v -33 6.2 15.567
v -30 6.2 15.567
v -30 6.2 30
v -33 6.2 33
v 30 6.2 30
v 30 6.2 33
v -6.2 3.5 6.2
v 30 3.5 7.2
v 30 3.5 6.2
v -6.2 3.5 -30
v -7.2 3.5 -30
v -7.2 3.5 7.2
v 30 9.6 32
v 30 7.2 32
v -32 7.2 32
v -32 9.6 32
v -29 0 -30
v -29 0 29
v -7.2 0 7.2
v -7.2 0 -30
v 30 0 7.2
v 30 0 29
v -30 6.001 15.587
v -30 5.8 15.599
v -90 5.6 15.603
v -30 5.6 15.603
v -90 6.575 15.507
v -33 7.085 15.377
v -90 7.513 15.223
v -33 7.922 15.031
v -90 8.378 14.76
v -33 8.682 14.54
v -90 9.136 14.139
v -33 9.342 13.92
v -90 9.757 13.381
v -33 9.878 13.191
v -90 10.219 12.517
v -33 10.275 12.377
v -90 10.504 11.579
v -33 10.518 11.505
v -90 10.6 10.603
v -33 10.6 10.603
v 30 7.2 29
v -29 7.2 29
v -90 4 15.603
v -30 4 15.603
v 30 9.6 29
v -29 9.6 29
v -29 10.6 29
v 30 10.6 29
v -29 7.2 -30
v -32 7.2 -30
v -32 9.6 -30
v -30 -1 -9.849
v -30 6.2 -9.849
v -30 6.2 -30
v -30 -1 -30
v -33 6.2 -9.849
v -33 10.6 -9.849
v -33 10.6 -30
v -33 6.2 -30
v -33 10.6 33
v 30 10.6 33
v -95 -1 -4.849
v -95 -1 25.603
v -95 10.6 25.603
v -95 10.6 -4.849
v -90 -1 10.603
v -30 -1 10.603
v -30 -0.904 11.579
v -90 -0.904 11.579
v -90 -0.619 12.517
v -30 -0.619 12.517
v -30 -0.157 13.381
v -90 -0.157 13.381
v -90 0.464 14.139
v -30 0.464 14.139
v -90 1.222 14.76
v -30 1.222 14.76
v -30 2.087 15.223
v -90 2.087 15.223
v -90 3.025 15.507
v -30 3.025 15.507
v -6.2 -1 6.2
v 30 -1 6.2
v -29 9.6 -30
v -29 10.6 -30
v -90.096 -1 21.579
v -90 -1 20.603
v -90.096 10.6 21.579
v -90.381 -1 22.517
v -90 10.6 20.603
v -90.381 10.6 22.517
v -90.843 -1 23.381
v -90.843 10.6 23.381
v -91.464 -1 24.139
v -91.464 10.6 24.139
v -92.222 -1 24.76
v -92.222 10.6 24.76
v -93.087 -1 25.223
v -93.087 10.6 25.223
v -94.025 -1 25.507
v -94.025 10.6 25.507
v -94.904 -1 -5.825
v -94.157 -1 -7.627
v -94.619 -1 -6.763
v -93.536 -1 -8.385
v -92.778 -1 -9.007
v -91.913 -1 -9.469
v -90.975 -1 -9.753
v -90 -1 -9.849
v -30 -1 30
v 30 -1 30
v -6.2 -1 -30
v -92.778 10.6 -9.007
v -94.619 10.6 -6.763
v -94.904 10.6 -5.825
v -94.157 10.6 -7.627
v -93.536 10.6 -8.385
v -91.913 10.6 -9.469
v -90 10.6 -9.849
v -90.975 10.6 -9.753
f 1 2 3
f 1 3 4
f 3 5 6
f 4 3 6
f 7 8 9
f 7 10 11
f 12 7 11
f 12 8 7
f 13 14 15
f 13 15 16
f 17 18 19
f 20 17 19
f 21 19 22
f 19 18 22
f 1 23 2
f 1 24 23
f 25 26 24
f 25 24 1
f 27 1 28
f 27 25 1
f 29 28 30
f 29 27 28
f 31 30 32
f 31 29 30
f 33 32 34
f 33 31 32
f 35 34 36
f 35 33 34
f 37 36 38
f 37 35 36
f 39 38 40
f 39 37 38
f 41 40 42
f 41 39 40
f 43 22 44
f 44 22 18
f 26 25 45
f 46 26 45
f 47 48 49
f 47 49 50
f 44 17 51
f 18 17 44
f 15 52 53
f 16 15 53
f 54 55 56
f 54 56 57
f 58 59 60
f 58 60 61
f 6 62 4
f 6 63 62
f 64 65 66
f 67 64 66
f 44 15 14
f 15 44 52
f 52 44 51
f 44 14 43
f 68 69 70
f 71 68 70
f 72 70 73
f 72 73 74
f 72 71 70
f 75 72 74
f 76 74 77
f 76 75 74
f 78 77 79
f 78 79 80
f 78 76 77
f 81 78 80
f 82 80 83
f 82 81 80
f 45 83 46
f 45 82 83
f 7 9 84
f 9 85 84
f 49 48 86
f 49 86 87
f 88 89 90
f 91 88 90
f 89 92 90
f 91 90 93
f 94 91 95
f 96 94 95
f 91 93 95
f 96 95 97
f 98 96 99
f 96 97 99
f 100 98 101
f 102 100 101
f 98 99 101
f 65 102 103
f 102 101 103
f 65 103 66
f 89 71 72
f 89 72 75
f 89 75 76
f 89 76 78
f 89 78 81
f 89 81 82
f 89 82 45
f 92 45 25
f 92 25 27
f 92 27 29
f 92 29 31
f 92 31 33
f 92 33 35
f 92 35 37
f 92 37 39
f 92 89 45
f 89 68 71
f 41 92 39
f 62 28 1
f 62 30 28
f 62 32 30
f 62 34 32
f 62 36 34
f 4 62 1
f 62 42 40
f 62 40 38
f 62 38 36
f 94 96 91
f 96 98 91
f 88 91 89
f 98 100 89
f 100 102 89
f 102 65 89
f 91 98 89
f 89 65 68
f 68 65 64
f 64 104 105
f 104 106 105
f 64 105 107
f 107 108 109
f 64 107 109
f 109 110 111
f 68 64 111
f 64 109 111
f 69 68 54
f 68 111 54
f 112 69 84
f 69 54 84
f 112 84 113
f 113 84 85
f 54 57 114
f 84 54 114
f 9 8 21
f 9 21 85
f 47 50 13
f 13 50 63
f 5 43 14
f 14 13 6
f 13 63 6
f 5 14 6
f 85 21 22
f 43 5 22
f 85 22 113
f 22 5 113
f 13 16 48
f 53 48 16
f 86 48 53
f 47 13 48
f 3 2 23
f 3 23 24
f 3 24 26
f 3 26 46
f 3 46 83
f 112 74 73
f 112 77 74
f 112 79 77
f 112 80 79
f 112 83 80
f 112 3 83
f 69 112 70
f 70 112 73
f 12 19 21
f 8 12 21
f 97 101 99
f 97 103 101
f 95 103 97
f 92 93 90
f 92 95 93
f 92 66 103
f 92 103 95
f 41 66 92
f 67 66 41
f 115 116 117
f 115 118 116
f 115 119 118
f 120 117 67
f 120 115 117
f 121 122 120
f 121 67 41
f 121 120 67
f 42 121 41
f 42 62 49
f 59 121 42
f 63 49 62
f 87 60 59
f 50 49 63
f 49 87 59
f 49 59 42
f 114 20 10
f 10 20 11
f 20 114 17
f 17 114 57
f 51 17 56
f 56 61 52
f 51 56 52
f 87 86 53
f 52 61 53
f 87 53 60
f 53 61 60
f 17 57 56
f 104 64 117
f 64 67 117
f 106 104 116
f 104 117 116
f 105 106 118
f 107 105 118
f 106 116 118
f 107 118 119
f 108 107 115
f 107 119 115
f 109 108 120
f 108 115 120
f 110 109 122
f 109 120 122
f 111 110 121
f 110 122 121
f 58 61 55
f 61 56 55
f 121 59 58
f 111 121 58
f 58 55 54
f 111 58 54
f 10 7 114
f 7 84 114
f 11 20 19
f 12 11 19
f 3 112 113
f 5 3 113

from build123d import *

# Parameters (mm, degrees)
F0_W         = 23.8
F0_H         = 23.8
F0_W_2       = 36.2
F0_H_2       = 36.2
F1_DEPTH     = 1
F2_W         = 59
F2_H         = 1
F2_W_2       = 1
F2_H_2       = 59
F3_DEPTH     = 7.2
F4_W         = 36.2
F4_H         = 1
F5_DEPTH     = 3.5
F6_W         = 60
F6_H         = 1
F7_DEPTH     = 3
F8_W         = 60
F8_H         = 1
F9_DEPTH     = 3.4
F10_W        = 60
F10_H        = 1
F11_DEPTH    = 3
F12_W        = 1
F12_H        = 60
F13_DEPTH    = 3
F14_W        = 1
F14_H        = 60
F15_DEPTH    = 3.4
F16_W        = 1
F16_H        = 60
F17_DEPTH    = 3
F18_DEPTH    = 3
F19_DEPTH    = 2
F20_W        = 7.2
F20_H        = 25.4523856565
F21_DEPTH    = 65
F22_W        = 4.4
F22_H        = 25.4523856565
F23_DEPTH    = 62
F24_W        = 5
F24_H        = 11.6
F25_DEPTH    = 10
F26_R        = 4.99999
F27_T1_DEPTH = 60
F27_T3_DEPTH = 57
F27_T8_DEPTH = 69.5
F28_R        = 5


# Not quite as in the source:
# - a fillet or chamfer that OpenCascade refuses, or shapes differently, is made with other operations: its cross-section is extruded or revolved along the edge and cut away or added
# - a fillet or chamfer is up to 0.001 mm smaller than in the source, because OpenCascade refuses the exact size


with BuildPart() as f1:
    # F0 (on Front) → F1 (new body)
    with BuildSketch(Plane.XZ):
        with Locations((-18.1, 18.1)):
            Rectangle(F0_W, F0_H)
        with Locations((11.9, 18.1)):
            Rectangle(F0_W_2, F0_H)
        with Locations((-18.1, -11.9)):
            Rectangle(F0_W, F0_H_2)
    extrude(amount=F1_DEPTH)

    # F2 (on face) → F3 (join)
    with BuildSketch(Plane(origin=(0, 0, 0), x_dir=(-1, 0, 0), z_dir=(0, 1, 0))):
        with Locations((-0.5, 29.5)):
            Rectangle(F2_W, F2_H)
        with Locations((29.5, 29.5)):
            Rectangle(F2_W_2, F2_H)
        with Locations((29.5, -0.5)):
            Rectangle(F2_W_2, F2_H_2)
    extrude(amount=F3_DEPTH)

    # F4 (on face) → F5 (join)
    with BuildSketch(Plane(origin=(0, 0, 0), x_dir=(-1, 0, 0), z_dir=(0, 1, 0))):
        with Locations((-11.9, 6.7)):
            Rectangle(F4_W, F4_H)
        Polygon((6.2, 7.2), (6.2, 6.2), (6.2, -30), (7.2, -30), (7.2, 7.2), align=None)
    extrude(amount=F5_DEPTH)

    # F6 (on face) → F7 (join)
    with BuildSketch(Plane.XY.offset(30)):
        with Locations((0, 6.7)):
            Rectangle(F6_W, F6_H)
    extrude(amount=F7_DEPTH)

    # F8 (on face) → F9 (join)
    with BuildSketch(Plane(origin=(0, 7.2, 0), x_dir=(-1, 0, 0), z_dir=(0, 1, 0))):
        with Locations((0, 32.5)):
            Rectangle(F8_W, F8_H)
    extrude(amount=F9_DEPTH)

    # F10 (on face) → F11 (join)
    with BuildSketch(Plane(origin=(0, 0, 32), x_dir=(1, 0, 0), z_dir=(0, 0, -1))):
        with Locations((0, -10.1)):
            Rectangle(F10_W, F10_H)
    extrude(amount=F11_DEPTH)

    # F12 (on face) → F13 (join)
    with BuildSketch(Plane(origin=(-30, 0, 0), x_dir=(0, -1, 0), z_dir=(-1, 0, 0))):
        with Locations((-6.7, 0)):
            Rectangle(F12_W, F12_H)
    extrude(amount=F13_DEPTH)

    # F14 (on face) → F15 (join)
    with BuildSketch(Plane(origin=(0, 7.2, 0), x_dir=(-1, 0, 0), z_dir=(0, 1, 0))):
        with Locations((32.5, 0)):
            Rectangle(F14_W, F14_H)
    extrude(amount=F15_DEPTH)

    # F16 (on face) → F17 (join)
    with BuildSketch(Plane.YZ.offset(-32)):
        with Locations((10.1, 0)):
            Rectangle(F16_W, F16_H)
    extrude(amount=F17_DEPTH)

    # F18 (add): a face of the model
    f18_faces = [f1.faces().sort_by_distance(p)[0] for p in [
        (-30, 6.2532541078, 31.5),
    ]]
    extrude(f18_faces, amount=F18_DEPTH)

    # F19 (add): a face of the model
    f19_faces = [f1.faces().sort_by_distance(p)[0] for p in [
        (-32.5, 8.4, 30),
    ]]
    extrude(f19_faces, amount=F19_DEPTH)

    # F20 (on face) → F21 (join)
    with BuildSketch(Plane(origin=(-30, 0, 0), x_dir=(0, -1, 0), z_dir=(-1, 0, 0))):
        with Locations((-2.6, 2.8769155033)):
            Rectangle(F20_W, F20_H)
    extrude(amount=F21_DEPTH)

    # F22 (on face) → F23 (join)
    with BuildSketch(Plane(origin=(-33, 0, 0), x_dir=(0, -1, 0), z_dir=(-1, 0, 0))):
        with Locations((-8.4, 2.8769155033)):
            Rectangle(F22_W, F22_H)
    extrude(amount=F23_DEPTH)

    # F24 (on face) → F25 (join)
    with BuildSketch(Plane.XY.offset(15.6031083316)):
        with Locations((-92.5, 4.8)):
            Rectangle(F24_W, F24_H)
    extrude(amount=F25_DEPTH)

    # F26 (radius 5 in the source; OpenCascade refuses exactly that, so slightly less here)
    f26_edges = [f1.edges().sort_by_distance(p)[0] for p in [
        (-90, 4.8, 25.603108),
    ]]
    fillet(f26_edges, radius=F26_R)

    # F27: fillet of radius 5 on 2 edges, made by hand

    # F27_s2 → F27_t1 (cut)
    with BuildSketch(Plane.YZ.offset(-90)):
        with BuildLine():
            ThreePointArc((-1, 10.6031083316), (0.4644660941, 14.1386422375), (4, 15.6031083316))
            Line((4, 15.6031083316), (-1, 15.6031083316))
            Line((-1, 15.6031083316), (-1, 10.6031083316))
        make_face()
    extrude(amount=F27_T1_DEPTH, mode=Mode.SUBTRACT)

    # F27_s4 → F27_t3 (cut)
    with BuildSketch(Plane.YZ.offset(-90)):
        with BuildLine():
            ThreePointArc((5.6, 15.6031083316), (9.1355339059, 14.1386422375), (10.6, 10.6031083316))
            Line((10.6, 10.6031083316), (10.6, 15.6031083316))
            Line((10.6, 15.6031083316), (5.6, 15.6031083316))
        make_face()
    extrude(amount=F27_T3_DEPTH, mode=Mode.SUBTRACT)


with BuildPart() as f27_tool6:
    # F27_s7 → F27_t8 (new body)
    with BuildSketch(Plane.YZ.offset(-20.5)):
        with BuildLine():
            ThreePointArc((5.6, 15.6031083316), (9.1355339059, 14.1386422375), (10.6, 10.6031083316))
            Line((10.6, 10.6031083316), (10.6, 15.6031083316))
            Line((10.6, 15.6031083316), (5.6, 15.6031083316))
        make_face()
    extrude(amount=-F27_T8_DEPTH)

    split(bisect_by=Plane.YZ.offset(-30), keep=Keep.BOTTOM)

    split(bisect_by=Plane.XZ.offset(-6.2), keep=Keep.TOP)


with BuildPart() as f1_1:
    add(f1.part)

    # F27_t5: cut F27_tool6
    add(f27_tool6.part, mode=Mode.SUBTRACT)

    # F28
    f28_edges = [f1_1.edges().sort_by_distance(p)[0] for p in [
        (-95, 4.8, -9.849277),
    ]]
    fillet(f28_edges, radius=F28_R)


solid = f1_1.part
